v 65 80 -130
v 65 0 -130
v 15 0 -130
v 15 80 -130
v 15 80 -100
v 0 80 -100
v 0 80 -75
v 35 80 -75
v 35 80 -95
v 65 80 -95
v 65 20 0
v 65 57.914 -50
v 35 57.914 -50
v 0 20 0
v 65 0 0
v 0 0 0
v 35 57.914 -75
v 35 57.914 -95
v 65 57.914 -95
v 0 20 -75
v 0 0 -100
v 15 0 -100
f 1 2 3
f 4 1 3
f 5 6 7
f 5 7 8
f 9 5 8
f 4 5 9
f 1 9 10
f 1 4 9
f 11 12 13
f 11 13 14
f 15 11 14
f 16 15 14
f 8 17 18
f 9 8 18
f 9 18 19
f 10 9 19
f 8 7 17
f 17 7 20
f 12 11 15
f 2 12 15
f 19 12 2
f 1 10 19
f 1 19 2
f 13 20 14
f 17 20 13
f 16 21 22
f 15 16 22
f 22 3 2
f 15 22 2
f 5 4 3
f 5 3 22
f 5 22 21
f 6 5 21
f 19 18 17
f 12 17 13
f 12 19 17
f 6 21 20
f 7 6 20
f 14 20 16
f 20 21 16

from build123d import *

# Parameters (mm, degrees)
BOSS_EXTRUDE1_DEPTH = 20
BOSS_EXTRUDE2_DEPTH = 80
BOSS_EXTRUDE6_DEPTH = 30
BOSS_EXTRUDE7_DEPTH = 75
CUT_EXTRUDE1_REACH  = 158.605


with BuildPart() as part:
    # Sketch1 → Boss-Extrude1 (new body)
    with BuildSketch(Plane(origin=(0, 0, 0), x_dir=(1, 0, 0), z_dir=(0, 1, 0))):
        Polygon((35, 75), (0, 75), (0, 0), (65, 0), (65, 95), (35, 95), align=None)
    extrude(amount=BOSS_EXTRUDE1_DEPTH)

    # Sketch1<3> → Boss-Extrude2 (add)
    with BuildSketch(Plane(origin=(0, 0, 0), x_dir=(1, 0, 0), z_dir=(0, 1, 0))):
        Polygon((15, 130), (15, 100), (0, 100), (0, 75), (35, 75), (35, 95), (65, 95), (65, 100), (65, 130), align=None)
    extrude(amount=BOSS_EXTRUDE2_DEPTH)

    # Sketch8 → Boss-Extrude6 (add)
    with BuildSketch(Plane(origin=(65, 0, 0), x_dir=(0, 0, -1), z_dir=(1, 0, 0))):
        Polygon((95, 57.913643311), (50, 57.913643311), (0, 20), (95, 20), align=None)
    extrude(amount=-BOSS_EXTRUDE6_DEPTH)

    # Sketch9 → Boss-Extrude7 (add)
    with BuildSketch(Plane.XY.offset(-75)):
        Polygon((0, 20), (35, 57.913643311), (35, 20), align=None)
    extrude(amount=BOSS_EXTRUDE7_DEPTH)

    # Sketch10 → Cut-Extrude1 (cut, up to next)
    with BuildSketch(Plane(origin=(35, 0, 0), x_dir=(0, 0, -1), z_dir=(1, 0, 0)), mode=Mode.PRIVATE) as cut_extrude1_sk1:
        Polygon((0, 57.913643311), (50, 57.913643311), (0, 20), align=None)
    cut_extrude1_tool1 = extrude(cut_extrude1_sk1.sketch, amount=-CUT_EXTRUDE1_REACH, mode=Mode.PRIVATE) & part.part
    add(cut_extrude1_tool1.solids().sort_by_distance((35, 45.275762, -16.666667))[0], mode=Mode.SUBTRACT)


solid = part.part
